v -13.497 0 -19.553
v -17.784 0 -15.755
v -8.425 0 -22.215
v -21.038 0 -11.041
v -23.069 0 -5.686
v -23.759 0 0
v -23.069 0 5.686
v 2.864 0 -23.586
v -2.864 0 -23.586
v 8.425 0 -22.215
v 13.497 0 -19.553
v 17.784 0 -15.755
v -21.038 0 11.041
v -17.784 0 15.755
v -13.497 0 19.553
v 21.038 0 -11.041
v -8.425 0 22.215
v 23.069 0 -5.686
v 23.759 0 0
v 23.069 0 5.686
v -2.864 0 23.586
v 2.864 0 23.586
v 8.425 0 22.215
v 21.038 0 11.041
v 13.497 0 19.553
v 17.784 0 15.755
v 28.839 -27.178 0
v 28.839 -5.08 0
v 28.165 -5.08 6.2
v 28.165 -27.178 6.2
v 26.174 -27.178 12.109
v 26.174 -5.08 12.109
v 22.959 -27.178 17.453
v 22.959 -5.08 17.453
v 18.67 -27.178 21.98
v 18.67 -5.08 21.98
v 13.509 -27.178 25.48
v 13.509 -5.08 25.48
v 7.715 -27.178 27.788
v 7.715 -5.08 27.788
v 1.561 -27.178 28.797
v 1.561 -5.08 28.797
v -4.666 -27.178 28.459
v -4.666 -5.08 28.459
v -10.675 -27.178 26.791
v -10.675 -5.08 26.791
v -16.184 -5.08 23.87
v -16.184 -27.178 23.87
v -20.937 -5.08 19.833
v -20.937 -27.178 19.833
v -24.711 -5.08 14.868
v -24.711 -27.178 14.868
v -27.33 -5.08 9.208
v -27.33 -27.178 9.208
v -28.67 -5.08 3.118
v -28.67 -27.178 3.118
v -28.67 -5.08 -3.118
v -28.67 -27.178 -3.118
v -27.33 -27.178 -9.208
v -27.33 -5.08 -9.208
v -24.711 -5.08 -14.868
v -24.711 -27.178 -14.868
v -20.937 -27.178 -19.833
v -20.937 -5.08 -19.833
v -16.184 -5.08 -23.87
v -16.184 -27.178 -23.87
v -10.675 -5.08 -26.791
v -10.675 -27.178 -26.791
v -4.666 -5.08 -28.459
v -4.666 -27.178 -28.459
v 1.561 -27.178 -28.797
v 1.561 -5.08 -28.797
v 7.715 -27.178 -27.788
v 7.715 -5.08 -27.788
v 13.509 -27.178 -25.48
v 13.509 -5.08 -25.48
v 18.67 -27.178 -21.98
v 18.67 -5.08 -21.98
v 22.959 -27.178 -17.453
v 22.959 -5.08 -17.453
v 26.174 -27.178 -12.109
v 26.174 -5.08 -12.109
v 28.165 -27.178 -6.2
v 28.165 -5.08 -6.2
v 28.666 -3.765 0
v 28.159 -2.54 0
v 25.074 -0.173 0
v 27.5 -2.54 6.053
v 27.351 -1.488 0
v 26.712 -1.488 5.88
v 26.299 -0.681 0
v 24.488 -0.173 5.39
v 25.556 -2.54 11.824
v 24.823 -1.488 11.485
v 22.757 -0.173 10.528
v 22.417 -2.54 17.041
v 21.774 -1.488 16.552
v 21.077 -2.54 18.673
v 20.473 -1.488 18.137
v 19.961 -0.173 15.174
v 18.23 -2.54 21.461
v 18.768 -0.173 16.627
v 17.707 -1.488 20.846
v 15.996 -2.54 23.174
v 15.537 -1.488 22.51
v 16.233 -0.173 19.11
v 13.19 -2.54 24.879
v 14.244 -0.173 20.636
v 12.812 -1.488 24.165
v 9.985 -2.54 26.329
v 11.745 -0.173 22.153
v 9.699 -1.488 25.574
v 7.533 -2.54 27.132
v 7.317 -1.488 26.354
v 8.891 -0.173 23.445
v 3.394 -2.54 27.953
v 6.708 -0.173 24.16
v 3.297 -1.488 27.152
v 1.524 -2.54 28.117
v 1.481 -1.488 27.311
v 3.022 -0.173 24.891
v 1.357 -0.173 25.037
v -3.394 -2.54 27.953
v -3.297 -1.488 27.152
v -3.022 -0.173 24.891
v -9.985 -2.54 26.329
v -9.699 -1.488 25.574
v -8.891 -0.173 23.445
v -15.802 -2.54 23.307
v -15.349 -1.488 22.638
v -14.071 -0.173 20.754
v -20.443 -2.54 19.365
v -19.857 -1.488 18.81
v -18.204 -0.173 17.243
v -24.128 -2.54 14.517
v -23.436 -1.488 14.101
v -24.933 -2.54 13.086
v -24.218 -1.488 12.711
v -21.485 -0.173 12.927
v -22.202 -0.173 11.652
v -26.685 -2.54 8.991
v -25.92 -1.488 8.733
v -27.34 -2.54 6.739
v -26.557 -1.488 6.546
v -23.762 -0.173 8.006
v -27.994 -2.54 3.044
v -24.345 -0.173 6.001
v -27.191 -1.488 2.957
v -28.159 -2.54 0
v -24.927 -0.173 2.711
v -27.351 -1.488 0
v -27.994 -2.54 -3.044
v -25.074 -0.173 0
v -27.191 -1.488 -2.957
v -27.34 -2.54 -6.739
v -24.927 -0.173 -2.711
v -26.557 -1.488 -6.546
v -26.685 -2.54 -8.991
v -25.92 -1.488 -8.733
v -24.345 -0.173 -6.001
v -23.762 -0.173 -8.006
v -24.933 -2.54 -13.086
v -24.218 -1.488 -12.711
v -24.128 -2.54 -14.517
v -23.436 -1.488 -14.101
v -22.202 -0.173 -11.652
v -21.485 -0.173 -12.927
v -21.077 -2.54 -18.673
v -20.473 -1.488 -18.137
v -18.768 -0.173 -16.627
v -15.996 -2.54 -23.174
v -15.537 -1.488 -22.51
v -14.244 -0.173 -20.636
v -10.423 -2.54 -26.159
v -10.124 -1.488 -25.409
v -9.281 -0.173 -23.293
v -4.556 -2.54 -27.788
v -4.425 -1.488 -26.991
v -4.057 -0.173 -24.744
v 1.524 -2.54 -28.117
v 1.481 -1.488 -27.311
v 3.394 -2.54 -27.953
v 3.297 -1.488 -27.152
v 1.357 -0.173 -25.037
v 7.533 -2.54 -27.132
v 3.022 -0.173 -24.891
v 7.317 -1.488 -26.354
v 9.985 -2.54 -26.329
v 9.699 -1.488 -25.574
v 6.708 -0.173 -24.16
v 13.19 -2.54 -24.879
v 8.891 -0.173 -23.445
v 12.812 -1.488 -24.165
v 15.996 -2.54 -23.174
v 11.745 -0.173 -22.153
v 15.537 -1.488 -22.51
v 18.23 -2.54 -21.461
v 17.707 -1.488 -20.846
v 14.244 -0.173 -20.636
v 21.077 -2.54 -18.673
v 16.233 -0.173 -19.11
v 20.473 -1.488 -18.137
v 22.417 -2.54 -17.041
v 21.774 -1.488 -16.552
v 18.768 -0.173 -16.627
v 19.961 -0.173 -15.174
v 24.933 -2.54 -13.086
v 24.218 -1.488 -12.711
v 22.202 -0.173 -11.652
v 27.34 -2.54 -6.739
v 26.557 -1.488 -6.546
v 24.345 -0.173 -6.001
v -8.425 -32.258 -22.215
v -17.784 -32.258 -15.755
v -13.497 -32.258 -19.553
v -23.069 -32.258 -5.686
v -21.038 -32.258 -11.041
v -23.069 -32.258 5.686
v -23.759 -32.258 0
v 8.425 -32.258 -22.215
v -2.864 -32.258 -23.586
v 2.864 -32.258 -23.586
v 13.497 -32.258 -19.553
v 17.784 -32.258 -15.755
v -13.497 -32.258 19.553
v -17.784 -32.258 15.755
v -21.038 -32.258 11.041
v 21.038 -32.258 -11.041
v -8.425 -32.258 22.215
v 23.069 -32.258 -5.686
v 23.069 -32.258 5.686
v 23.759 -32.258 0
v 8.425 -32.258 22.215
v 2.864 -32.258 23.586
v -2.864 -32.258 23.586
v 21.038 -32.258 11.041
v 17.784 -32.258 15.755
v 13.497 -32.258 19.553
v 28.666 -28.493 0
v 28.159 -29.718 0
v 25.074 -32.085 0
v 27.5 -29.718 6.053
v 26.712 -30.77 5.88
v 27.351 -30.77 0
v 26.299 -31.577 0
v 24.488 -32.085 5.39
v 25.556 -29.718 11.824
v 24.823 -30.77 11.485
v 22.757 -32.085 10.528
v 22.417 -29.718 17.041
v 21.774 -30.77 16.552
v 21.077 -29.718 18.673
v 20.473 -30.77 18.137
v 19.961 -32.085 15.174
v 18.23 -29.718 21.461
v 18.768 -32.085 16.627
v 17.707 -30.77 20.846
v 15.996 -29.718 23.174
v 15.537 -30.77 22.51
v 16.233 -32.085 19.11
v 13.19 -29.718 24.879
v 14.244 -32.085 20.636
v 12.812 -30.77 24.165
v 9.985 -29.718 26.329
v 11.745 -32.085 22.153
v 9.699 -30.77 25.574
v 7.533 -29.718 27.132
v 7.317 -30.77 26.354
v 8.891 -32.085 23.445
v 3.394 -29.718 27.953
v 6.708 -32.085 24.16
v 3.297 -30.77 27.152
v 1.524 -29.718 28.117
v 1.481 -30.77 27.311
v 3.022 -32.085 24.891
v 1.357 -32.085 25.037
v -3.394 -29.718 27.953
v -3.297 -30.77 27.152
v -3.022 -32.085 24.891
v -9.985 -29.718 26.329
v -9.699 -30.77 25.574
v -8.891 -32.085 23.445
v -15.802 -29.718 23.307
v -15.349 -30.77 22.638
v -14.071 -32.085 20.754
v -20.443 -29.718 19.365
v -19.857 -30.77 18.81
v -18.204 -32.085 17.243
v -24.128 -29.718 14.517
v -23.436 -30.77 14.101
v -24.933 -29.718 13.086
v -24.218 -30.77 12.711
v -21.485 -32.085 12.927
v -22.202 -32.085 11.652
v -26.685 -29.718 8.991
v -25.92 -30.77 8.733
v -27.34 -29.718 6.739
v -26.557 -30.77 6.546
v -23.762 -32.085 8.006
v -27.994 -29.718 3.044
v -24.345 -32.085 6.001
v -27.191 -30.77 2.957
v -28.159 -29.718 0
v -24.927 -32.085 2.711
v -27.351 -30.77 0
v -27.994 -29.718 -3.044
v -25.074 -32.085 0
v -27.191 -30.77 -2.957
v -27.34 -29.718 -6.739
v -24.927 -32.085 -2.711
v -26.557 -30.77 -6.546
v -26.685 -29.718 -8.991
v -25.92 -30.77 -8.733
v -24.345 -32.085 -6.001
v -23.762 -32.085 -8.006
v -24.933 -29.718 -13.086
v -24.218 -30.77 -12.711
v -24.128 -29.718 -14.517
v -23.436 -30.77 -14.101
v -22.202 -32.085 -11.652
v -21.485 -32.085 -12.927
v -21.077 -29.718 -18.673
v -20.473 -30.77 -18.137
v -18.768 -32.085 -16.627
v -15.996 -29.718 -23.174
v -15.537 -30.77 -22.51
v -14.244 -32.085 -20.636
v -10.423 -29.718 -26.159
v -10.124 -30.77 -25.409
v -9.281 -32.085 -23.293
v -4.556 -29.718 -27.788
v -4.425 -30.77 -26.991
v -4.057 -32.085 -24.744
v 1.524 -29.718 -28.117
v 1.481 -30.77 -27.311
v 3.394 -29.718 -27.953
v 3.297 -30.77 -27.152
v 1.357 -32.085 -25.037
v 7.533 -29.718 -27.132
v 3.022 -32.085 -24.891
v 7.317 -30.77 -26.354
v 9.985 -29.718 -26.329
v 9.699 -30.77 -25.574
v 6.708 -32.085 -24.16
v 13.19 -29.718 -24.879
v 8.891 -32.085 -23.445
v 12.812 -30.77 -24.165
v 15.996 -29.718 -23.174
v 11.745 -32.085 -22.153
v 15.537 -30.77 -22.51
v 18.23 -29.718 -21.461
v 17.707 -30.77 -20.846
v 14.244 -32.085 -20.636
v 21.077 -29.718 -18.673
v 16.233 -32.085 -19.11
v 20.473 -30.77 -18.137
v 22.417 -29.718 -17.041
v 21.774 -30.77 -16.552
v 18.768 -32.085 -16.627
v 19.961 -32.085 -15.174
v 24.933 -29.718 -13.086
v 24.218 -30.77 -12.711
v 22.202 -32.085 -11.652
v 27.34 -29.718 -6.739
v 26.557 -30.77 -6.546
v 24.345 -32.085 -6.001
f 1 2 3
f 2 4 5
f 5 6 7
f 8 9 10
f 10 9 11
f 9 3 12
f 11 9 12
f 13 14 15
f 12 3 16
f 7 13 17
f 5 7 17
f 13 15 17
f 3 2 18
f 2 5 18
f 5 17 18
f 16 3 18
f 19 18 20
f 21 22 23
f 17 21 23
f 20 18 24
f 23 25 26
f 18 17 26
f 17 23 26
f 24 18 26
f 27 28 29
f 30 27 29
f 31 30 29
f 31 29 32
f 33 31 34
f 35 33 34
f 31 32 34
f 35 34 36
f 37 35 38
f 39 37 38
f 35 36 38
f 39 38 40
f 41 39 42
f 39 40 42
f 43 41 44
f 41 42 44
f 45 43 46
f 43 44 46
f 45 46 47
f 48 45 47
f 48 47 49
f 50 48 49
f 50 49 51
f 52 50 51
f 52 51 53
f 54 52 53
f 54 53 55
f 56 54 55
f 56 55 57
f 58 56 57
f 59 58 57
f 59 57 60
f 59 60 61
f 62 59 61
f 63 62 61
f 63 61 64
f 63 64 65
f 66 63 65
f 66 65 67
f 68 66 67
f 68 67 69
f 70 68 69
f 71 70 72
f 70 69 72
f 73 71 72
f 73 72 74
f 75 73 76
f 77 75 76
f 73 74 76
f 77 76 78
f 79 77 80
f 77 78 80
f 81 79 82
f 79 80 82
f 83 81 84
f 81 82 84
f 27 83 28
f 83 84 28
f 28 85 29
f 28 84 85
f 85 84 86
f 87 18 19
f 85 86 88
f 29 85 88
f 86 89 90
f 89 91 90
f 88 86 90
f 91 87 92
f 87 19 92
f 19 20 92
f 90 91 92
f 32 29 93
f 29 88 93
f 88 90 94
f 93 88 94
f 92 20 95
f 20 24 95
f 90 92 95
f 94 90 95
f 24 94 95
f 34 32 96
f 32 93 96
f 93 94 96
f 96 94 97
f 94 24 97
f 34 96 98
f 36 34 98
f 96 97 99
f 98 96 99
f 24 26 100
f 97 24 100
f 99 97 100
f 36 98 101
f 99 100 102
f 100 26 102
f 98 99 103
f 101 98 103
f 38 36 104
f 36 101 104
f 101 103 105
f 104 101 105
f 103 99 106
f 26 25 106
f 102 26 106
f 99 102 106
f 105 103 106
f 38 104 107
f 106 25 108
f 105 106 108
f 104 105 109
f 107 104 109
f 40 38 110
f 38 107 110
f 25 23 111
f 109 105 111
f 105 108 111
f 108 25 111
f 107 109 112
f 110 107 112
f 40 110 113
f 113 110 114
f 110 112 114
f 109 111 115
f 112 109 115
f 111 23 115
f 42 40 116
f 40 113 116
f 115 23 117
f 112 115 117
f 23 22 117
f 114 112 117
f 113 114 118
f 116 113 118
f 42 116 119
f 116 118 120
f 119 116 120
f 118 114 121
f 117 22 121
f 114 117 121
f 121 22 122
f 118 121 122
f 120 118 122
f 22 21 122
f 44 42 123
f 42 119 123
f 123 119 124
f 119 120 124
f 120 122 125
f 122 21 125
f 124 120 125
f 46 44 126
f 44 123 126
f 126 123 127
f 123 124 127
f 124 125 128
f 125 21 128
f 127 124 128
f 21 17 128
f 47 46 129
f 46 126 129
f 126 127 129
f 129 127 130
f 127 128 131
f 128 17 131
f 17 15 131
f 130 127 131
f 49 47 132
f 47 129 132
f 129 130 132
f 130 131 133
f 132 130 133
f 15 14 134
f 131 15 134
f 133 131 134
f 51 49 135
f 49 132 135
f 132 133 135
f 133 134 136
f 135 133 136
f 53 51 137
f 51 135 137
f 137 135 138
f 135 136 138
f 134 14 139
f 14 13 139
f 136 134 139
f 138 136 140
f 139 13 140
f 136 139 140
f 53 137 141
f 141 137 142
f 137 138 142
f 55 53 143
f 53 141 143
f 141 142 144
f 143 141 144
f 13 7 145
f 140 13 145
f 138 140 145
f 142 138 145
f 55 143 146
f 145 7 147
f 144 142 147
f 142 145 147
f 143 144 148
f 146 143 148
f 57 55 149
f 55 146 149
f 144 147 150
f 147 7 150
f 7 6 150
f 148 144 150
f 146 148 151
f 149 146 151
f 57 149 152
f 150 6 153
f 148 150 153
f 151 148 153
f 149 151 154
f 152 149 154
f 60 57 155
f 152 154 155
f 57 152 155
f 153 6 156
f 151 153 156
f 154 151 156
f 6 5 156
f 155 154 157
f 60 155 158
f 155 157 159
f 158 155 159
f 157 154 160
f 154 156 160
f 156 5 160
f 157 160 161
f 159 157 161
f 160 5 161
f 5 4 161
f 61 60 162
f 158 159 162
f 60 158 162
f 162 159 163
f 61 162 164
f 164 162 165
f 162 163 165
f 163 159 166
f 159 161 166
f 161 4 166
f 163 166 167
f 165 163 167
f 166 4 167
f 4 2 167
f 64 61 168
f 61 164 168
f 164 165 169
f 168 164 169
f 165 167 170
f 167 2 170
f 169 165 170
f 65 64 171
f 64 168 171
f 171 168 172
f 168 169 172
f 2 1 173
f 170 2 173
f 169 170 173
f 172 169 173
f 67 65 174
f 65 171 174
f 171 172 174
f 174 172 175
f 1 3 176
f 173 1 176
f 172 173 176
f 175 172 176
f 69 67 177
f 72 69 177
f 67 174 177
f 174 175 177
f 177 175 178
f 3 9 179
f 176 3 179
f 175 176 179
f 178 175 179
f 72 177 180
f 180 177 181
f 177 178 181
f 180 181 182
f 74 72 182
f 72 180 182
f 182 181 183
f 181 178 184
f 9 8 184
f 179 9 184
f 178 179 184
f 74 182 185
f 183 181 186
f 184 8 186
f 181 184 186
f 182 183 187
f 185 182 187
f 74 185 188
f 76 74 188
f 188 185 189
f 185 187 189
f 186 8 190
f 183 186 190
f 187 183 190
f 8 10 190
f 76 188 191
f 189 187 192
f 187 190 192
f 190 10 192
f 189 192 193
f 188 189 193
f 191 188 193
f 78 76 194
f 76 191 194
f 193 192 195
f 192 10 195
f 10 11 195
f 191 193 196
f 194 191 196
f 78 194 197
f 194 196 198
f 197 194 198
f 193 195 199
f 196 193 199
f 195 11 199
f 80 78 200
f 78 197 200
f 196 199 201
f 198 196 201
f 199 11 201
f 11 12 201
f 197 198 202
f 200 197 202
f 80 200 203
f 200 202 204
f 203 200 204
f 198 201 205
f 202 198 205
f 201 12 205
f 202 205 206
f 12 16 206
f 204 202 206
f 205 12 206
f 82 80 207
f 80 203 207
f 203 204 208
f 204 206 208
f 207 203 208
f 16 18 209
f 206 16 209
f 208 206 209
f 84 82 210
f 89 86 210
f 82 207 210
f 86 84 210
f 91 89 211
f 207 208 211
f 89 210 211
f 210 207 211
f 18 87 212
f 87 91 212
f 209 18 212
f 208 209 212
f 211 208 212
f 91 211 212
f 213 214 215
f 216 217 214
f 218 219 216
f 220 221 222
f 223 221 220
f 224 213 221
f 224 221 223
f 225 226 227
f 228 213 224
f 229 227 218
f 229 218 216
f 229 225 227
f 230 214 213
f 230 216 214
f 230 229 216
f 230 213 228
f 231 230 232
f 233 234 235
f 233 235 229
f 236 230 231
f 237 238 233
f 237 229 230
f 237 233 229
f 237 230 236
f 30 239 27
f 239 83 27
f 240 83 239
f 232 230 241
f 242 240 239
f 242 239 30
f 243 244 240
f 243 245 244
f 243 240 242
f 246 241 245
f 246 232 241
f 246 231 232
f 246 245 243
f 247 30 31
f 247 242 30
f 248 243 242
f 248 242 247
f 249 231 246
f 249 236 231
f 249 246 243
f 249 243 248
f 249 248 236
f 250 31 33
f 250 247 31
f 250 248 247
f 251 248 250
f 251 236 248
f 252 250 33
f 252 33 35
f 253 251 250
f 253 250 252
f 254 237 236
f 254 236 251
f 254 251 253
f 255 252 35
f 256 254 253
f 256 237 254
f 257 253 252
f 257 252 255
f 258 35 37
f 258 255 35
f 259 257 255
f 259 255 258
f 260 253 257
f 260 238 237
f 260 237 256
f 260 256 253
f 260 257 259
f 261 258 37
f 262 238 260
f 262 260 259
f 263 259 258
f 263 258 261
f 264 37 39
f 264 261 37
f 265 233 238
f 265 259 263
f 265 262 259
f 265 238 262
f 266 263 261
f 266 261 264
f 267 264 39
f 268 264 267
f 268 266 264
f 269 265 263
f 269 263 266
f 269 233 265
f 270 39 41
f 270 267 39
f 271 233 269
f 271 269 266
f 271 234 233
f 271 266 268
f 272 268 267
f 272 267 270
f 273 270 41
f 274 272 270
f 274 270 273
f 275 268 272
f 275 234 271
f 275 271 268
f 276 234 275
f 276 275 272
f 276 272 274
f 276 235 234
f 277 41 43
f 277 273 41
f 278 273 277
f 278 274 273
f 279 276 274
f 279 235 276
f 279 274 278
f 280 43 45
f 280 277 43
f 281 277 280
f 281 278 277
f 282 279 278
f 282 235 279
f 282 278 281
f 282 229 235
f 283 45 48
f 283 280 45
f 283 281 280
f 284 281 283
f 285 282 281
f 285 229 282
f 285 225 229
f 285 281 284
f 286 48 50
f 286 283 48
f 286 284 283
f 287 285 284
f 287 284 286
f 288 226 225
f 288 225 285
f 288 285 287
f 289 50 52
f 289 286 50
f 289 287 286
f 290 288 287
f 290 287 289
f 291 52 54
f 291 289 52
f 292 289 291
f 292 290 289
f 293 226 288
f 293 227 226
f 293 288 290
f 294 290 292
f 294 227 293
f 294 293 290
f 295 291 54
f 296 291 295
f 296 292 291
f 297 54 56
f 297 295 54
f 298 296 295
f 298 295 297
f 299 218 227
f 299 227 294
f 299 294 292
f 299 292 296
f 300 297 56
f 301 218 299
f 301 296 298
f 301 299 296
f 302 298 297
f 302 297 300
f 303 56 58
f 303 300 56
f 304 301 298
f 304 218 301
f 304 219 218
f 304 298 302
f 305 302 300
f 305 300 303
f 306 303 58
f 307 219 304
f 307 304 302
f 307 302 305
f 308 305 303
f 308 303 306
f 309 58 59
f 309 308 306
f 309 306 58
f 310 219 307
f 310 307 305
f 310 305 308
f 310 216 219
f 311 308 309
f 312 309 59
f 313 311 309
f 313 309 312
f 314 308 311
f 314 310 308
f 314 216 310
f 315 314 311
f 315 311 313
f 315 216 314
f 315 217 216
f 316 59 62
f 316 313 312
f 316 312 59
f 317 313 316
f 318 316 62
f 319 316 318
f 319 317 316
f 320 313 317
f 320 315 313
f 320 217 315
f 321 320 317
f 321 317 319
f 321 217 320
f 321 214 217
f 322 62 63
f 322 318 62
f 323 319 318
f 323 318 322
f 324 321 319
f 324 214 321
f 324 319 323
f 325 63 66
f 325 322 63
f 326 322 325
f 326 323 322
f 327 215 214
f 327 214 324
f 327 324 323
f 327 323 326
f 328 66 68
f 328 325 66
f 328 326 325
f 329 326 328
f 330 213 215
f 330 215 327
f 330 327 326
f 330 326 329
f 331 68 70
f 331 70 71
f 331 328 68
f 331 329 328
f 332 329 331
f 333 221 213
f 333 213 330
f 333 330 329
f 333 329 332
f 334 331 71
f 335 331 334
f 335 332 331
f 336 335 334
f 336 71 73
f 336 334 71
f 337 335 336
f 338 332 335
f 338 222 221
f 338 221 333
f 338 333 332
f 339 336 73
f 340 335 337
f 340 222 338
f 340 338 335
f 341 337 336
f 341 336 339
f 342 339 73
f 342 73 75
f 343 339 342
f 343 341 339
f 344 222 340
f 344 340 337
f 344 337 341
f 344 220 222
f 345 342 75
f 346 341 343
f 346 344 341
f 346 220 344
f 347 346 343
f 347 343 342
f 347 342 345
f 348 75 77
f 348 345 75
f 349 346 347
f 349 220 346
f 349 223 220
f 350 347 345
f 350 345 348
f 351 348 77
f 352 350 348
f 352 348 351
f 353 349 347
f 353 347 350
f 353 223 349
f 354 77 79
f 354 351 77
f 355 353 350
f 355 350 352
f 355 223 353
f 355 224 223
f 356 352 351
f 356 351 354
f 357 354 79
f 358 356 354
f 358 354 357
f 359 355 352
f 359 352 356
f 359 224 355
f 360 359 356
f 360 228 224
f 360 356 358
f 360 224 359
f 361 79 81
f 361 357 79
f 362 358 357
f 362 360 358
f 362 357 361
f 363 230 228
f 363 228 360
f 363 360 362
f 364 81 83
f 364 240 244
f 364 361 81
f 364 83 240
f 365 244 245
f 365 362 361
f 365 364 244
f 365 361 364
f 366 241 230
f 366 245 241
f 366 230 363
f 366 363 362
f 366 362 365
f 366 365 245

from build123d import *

# Parameters (mm, degrees)
F0_R     = 28.8392585449
F1_DEPTH = 6.858
F2_DEPTH = 25.4
F3_R     = 5.08
F4_R     = 5.08


with BuildPart() as f1:
    # F0 (on Front) → F1 (new body)
    with BuildSketch(Plane.XZ):
        Circle(F0_R)
    extrude(amount=F1_DEPTH)

    # F2 (add): a face of the model
    f2_faces = [f1.faces().sort_by_distance(p)[0] for p in [
        (0, -6.858, 0),
    ]]
    extrude(f2_faces, amount=F2_DEPTH)

    # F3
    f3_edges = [f1.edges().sort_by_distance(p)[0] for p in [
        (-28.839259, -32.258, 0),
    ]]
    fillet(f3_edges, radius=F3_R)

    # F4
    f4_edges = [f1.edges().sort_by_distance(p)[0] for p in [
        (28.839259, -13.589, 0),
        (-28.839259, -27.178, 0),
        (-28.839259, 0, 0),
    ]]
    fillet(f4_edges, radius=F4_R)


solid = f1.part
